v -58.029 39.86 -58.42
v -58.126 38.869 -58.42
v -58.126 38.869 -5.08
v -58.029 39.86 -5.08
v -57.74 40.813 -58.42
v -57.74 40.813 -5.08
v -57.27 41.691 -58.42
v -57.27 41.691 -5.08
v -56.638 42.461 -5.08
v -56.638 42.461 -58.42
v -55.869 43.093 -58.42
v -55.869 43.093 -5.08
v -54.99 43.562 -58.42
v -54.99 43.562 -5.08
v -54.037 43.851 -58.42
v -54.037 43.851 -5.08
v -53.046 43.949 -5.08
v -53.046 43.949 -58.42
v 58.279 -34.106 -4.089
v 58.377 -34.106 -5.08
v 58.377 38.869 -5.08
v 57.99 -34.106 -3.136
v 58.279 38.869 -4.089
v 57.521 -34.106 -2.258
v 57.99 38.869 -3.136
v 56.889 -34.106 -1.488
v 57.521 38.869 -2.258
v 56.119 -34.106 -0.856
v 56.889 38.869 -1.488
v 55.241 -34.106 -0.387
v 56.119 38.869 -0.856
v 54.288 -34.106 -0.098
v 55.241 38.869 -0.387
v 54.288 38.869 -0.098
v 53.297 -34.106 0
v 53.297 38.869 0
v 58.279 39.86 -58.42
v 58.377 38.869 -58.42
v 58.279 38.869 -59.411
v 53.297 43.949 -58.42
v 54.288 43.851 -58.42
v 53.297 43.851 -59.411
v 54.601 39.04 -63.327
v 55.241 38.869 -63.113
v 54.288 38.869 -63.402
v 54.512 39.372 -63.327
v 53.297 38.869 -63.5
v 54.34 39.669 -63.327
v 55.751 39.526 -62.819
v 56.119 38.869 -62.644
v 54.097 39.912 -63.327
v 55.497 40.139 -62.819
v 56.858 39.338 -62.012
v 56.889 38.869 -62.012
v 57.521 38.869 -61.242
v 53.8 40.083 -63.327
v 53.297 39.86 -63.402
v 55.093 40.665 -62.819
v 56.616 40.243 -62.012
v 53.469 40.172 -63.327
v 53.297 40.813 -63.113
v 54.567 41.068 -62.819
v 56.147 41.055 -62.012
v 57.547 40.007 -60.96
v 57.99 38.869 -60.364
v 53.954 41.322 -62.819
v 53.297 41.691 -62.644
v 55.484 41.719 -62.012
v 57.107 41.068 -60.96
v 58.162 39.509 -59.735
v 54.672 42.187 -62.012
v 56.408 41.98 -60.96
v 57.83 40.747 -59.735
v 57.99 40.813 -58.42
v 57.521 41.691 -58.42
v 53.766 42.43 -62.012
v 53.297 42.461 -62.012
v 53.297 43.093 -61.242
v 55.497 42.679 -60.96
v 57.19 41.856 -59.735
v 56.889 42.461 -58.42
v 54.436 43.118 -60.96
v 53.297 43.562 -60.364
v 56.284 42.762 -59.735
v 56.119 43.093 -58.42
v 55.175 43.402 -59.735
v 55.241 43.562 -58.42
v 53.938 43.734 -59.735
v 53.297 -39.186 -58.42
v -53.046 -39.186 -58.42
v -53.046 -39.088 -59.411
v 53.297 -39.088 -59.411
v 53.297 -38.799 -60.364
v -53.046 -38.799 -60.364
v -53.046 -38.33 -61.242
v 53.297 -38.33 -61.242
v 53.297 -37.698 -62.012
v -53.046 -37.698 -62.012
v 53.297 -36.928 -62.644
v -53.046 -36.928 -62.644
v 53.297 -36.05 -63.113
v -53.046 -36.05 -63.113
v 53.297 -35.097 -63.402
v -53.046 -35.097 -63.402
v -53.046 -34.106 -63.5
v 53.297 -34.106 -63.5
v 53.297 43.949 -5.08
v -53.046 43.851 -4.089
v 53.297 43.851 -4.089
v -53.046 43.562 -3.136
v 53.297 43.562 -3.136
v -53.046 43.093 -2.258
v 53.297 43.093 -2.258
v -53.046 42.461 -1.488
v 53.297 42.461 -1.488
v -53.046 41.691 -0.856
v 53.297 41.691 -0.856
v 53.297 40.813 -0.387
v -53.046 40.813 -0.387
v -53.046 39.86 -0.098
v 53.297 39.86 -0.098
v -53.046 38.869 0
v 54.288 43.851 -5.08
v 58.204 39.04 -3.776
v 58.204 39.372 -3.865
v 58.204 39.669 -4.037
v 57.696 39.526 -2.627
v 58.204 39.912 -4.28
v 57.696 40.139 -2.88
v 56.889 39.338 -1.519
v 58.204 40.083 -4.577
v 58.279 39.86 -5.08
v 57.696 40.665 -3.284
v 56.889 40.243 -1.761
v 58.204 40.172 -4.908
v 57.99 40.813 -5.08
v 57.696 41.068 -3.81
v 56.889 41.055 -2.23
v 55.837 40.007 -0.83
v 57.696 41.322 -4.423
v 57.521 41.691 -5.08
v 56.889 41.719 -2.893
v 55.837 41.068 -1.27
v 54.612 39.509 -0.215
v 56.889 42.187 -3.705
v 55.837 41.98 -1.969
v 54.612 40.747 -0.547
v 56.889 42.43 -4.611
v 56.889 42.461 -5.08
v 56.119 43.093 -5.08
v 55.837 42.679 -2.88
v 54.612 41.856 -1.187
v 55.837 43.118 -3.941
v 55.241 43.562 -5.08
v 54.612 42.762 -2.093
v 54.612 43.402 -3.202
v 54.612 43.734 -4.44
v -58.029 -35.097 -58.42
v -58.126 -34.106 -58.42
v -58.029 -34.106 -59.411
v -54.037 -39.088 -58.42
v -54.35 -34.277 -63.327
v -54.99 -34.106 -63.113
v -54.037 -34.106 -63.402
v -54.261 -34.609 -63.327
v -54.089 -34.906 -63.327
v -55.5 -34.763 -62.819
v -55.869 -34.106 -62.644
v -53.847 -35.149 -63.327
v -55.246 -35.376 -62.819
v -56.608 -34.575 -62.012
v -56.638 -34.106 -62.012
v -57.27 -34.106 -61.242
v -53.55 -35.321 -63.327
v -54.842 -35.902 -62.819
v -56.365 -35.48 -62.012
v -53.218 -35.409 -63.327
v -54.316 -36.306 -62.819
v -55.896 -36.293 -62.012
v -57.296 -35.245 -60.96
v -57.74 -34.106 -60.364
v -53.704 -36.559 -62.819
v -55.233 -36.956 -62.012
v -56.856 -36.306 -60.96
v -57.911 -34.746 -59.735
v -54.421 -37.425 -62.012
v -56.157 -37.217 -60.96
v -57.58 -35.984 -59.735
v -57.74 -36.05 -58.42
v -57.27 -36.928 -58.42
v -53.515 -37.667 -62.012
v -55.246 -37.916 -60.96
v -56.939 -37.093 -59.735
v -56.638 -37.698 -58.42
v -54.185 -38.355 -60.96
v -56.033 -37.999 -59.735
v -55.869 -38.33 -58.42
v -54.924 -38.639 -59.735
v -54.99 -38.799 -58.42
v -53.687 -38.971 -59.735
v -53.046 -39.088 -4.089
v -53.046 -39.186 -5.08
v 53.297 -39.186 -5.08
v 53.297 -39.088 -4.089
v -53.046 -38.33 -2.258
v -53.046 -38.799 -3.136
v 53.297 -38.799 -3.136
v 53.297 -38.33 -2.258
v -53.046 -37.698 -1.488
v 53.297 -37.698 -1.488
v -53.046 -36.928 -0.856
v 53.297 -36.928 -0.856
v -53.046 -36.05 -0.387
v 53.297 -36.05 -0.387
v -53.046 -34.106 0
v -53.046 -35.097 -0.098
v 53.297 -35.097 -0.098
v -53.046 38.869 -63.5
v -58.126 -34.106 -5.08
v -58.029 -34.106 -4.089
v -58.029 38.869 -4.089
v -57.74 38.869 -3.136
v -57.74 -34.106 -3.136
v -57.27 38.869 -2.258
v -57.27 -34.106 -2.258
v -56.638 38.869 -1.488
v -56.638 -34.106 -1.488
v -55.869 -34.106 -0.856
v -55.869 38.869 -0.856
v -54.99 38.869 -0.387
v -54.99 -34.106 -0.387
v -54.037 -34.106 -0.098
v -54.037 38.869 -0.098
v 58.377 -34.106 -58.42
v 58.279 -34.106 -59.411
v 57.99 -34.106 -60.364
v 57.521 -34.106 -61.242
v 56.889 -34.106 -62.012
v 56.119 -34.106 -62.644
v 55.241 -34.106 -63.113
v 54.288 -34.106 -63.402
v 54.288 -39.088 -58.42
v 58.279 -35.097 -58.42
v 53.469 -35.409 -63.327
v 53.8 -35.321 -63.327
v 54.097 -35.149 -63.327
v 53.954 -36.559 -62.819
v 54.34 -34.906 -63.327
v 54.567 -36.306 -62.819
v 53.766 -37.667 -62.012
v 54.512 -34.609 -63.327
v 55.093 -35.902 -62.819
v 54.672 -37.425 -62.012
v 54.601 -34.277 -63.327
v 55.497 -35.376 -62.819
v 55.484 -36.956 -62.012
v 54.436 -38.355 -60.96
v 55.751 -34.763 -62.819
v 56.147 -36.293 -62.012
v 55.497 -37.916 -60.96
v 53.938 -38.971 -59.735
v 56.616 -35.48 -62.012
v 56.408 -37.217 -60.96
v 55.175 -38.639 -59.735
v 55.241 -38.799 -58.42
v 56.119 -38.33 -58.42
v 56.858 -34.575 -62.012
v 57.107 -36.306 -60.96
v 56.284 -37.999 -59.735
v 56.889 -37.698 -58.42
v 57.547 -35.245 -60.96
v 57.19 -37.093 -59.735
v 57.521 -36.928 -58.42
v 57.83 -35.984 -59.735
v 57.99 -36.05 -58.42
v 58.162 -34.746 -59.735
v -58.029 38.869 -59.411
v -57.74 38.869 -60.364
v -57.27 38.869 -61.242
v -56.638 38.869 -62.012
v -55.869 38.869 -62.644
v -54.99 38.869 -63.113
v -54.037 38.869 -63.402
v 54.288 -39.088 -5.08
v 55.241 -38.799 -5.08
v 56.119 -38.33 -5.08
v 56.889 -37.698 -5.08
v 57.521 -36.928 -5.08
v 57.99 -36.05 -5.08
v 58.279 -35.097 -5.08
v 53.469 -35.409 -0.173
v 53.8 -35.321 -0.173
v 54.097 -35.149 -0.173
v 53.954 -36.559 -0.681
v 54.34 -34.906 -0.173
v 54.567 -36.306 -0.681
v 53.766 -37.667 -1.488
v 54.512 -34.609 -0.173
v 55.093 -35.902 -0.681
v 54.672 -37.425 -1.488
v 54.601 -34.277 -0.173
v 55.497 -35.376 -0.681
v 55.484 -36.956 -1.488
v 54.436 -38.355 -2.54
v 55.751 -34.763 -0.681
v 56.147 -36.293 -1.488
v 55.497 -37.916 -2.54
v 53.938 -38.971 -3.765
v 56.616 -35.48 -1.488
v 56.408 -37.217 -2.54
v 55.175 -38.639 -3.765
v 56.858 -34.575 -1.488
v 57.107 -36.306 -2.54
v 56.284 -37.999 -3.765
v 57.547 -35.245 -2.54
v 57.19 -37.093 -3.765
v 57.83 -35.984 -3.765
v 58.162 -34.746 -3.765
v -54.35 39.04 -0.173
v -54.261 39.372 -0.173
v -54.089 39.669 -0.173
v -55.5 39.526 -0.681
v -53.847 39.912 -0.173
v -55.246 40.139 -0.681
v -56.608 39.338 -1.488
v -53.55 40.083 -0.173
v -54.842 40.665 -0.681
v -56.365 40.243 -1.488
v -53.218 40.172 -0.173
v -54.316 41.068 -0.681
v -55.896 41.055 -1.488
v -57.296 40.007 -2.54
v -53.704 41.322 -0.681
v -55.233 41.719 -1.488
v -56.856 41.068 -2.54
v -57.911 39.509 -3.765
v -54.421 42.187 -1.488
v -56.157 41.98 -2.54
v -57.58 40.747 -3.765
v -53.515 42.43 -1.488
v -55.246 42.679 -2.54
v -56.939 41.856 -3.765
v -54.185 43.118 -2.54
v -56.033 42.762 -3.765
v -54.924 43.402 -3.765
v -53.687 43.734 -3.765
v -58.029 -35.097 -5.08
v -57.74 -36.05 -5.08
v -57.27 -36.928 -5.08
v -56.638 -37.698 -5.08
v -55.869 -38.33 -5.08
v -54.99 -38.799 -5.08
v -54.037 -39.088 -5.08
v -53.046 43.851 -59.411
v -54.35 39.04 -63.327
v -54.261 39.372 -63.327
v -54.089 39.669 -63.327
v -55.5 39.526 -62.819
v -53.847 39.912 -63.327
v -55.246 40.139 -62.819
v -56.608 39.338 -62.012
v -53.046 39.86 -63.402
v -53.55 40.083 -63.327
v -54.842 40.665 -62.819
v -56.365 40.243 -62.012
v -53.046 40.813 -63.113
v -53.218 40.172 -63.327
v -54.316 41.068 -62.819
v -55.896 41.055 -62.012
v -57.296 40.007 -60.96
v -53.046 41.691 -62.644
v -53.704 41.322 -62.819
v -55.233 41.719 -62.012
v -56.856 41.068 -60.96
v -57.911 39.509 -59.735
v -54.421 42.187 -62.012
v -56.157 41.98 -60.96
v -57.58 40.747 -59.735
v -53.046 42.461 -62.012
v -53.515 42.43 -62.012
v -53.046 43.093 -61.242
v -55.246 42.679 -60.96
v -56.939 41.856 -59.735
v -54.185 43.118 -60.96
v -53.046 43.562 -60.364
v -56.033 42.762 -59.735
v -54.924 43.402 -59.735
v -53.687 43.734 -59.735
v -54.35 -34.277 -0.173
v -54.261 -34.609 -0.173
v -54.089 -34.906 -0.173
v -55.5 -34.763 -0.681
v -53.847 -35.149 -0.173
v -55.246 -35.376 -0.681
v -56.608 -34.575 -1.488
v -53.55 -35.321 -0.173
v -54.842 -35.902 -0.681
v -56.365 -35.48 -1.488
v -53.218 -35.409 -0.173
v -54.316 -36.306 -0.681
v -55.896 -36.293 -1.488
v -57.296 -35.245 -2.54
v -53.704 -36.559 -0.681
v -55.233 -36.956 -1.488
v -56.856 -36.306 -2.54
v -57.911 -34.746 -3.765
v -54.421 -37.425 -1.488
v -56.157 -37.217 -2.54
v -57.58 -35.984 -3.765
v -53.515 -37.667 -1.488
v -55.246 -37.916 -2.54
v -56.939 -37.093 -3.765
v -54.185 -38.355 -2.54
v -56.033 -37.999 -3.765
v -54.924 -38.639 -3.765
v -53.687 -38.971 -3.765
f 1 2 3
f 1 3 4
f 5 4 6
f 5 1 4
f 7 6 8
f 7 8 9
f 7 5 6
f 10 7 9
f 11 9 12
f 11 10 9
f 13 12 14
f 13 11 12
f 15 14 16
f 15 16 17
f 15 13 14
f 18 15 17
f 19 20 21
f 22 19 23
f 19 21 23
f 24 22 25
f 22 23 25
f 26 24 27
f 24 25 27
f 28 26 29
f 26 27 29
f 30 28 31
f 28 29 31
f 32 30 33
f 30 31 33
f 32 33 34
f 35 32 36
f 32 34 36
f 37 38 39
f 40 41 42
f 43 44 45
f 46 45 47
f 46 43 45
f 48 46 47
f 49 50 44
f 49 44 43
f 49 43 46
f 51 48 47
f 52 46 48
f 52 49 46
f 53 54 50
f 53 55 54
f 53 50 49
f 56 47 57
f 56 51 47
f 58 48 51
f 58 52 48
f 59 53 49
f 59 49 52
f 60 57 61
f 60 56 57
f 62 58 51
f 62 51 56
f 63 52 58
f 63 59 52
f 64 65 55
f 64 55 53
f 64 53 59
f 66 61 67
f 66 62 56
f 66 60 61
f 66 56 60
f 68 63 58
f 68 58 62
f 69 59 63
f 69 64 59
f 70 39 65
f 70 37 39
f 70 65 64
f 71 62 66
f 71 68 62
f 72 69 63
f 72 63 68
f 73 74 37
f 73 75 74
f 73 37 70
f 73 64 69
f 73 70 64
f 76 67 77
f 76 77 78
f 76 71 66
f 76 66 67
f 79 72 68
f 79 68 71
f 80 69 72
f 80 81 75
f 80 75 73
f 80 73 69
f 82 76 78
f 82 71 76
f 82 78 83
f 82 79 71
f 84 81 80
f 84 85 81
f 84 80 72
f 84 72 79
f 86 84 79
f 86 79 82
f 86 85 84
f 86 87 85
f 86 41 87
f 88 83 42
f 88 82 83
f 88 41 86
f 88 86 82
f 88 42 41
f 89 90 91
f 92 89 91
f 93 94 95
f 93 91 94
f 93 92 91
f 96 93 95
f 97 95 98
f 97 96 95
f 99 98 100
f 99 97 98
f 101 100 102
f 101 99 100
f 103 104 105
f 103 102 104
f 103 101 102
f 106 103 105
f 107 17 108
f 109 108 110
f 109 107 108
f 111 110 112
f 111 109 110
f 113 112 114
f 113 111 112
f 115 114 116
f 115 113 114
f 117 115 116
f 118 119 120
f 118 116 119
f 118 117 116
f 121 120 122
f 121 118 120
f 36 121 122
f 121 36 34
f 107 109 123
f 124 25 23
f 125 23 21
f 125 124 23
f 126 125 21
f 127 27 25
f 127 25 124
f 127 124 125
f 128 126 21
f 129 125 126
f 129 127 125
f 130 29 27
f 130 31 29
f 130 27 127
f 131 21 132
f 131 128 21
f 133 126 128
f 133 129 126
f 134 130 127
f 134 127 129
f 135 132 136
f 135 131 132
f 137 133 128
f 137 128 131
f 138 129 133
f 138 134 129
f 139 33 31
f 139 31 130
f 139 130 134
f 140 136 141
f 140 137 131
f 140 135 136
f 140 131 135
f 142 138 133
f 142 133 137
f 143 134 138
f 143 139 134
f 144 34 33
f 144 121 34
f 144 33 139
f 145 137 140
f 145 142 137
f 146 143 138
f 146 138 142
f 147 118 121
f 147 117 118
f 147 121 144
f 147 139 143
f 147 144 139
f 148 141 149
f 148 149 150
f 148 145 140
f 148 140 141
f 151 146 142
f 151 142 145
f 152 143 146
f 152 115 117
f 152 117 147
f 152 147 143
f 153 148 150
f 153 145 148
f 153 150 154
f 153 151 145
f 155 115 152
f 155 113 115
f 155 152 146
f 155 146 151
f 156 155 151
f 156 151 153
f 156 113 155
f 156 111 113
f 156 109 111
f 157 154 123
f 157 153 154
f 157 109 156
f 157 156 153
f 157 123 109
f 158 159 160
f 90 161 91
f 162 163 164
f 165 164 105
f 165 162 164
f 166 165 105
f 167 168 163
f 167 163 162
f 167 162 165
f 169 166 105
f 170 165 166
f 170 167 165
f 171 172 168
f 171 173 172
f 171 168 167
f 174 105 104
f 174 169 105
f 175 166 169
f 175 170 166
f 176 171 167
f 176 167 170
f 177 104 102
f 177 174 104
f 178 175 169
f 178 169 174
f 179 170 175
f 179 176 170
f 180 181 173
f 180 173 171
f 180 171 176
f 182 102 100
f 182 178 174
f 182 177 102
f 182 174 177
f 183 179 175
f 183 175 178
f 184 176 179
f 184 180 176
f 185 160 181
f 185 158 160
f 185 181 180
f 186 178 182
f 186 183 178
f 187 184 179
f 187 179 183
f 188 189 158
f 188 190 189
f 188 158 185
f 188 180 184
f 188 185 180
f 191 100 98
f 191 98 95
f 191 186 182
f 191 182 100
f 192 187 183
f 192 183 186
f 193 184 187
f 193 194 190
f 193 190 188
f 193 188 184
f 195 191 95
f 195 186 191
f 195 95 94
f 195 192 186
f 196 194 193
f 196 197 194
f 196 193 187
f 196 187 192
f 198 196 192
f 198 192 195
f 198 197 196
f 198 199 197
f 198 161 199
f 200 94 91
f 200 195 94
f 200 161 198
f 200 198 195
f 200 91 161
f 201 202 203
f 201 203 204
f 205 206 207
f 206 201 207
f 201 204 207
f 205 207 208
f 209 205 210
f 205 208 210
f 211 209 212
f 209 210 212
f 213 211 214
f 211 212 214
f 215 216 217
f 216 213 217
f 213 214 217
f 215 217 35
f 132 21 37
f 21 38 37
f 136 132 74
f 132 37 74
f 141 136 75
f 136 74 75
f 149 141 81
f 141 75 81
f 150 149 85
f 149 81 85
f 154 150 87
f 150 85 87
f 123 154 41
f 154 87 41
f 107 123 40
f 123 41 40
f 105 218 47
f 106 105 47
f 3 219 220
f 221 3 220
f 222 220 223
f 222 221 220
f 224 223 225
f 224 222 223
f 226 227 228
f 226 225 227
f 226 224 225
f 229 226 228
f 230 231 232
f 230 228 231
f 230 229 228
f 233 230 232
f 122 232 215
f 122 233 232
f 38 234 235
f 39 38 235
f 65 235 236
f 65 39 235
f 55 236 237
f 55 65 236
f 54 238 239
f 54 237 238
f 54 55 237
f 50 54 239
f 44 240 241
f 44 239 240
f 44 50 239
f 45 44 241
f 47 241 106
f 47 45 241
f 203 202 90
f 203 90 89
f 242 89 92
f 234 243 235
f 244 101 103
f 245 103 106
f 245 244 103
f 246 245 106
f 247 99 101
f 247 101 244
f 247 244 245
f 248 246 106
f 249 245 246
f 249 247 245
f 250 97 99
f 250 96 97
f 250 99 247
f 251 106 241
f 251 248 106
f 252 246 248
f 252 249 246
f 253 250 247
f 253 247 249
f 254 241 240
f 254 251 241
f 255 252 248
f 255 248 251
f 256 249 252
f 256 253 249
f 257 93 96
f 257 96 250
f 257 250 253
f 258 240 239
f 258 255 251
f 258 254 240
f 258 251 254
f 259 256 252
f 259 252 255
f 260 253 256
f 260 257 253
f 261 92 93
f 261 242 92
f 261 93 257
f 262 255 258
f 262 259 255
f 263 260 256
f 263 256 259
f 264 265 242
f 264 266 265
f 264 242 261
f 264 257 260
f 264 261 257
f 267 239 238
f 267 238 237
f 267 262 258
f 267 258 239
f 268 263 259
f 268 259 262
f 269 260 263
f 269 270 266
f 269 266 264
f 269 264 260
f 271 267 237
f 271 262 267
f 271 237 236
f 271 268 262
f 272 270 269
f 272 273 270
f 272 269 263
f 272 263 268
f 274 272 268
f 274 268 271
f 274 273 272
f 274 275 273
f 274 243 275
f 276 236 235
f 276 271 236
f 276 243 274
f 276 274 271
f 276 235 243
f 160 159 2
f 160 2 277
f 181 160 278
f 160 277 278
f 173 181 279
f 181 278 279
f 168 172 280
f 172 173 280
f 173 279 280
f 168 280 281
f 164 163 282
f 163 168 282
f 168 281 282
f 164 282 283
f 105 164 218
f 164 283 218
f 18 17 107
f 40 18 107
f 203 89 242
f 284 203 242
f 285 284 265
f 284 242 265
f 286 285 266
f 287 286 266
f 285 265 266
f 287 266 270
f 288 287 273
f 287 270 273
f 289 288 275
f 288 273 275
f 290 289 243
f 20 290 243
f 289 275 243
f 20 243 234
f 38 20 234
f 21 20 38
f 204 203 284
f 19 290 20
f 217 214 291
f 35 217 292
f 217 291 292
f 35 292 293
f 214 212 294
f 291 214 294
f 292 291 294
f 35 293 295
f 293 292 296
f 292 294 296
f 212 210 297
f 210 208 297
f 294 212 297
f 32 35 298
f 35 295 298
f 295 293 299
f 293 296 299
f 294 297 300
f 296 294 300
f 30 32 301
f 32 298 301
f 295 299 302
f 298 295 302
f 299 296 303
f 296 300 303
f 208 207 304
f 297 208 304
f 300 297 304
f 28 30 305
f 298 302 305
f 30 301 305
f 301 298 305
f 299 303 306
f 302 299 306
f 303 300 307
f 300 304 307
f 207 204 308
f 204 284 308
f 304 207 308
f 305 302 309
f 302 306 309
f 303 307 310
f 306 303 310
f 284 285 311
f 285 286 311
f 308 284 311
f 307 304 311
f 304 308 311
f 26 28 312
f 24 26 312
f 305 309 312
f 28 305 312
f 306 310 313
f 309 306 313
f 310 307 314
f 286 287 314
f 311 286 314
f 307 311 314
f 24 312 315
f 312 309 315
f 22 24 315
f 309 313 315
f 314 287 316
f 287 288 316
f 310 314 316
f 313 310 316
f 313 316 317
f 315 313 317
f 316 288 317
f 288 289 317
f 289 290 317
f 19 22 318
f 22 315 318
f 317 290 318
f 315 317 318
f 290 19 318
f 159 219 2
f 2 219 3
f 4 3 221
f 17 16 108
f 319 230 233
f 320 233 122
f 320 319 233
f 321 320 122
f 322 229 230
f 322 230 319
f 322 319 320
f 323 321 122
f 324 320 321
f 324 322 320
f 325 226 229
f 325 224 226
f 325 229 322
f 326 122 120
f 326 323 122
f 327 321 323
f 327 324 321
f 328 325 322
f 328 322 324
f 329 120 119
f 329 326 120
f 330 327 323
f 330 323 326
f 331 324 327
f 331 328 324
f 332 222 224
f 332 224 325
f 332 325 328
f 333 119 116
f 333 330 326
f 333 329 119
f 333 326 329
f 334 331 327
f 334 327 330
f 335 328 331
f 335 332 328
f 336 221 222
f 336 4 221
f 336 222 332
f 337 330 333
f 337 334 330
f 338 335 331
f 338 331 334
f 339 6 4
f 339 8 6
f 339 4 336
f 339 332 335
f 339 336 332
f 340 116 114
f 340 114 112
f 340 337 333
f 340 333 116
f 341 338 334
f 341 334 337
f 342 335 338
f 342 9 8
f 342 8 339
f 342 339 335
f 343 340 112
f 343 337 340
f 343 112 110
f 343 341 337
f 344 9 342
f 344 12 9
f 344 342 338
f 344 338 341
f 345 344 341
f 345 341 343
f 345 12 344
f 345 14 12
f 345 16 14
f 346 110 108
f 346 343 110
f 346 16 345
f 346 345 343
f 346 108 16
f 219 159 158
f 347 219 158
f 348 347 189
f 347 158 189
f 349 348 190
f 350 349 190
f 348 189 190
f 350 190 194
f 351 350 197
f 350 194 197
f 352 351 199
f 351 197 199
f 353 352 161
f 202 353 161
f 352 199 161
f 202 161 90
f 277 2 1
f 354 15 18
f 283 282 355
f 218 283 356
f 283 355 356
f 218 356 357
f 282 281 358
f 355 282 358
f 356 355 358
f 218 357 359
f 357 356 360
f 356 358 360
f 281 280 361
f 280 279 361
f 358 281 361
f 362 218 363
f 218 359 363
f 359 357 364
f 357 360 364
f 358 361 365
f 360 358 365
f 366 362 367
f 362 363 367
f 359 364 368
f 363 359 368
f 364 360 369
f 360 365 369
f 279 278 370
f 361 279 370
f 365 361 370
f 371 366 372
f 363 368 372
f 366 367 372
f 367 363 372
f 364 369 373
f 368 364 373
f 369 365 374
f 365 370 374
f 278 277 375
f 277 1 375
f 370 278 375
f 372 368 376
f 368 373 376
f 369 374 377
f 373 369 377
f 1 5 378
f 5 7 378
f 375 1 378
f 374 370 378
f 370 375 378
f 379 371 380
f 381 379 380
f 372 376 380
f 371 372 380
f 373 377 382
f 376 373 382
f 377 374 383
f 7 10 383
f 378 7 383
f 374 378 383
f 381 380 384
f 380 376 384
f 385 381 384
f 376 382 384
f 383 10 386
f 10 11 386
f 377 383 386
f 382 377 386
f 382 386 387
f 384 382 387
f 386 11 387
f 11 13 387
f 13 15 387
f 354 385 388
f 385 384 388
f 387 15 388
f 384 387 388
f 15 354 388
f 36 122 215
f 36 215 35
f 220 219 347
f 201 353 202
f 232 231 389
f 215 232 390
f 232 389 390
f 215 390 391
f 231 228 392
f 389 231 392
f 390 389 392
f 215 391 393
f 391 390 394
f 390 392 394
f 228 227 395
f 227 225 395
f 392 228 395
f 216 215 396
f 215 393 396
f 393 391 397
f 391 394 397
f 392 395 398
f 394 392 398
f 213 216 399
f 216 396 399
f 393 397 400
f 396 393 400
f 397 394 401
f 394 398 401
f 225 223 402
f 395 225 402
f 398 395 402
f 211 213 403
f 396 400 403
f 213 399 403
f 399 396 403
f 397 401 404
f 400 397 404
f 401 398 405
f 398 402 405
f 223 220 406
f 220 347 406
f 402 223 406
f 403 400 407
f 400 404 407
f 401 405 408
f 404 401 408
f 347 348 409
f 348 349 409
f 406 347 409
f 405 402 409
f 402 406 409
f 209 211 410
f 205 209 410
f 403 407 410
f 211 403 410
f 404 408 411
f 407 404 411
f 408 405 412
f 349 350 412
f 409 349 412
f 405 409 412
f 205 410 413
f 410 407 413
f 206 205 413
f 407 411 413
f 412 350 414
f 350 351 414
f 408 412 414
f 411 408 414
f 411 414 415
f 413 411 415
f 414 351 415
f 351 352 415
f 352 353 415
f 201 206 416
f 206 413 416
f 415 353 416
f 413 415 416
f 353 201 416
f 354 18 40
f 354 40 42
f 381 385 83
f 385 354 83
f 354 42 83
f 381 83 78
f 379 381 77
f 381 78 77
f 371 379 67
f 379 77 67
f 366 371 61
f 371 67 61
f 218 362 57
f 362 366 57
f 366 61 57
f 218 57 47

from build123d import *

# Parameters (mm, degrees)
F0_W     = 116.503421
F0_H     = 83.134603
F1_DEPTH = 63.5
F2_R     = 5.08


with BuildPart() as f1:
    # F0 (on Top) → F1 (new body)
    with BuildSketch(Plane.XY):
        with Locations((0.125355, 2.381445)):
            Rectangle(F0_W, F0_H)
    extrude(amount=-F1_DEPTH)

    # F2
    f2_edges = [f1.edges().sort_by_distance(p)[0] for p in [
        (-58.126356, 43.948747, -31.75),
        (-58.126356, -39.185856, -31.75),
        (-58.126356, 2.381446, 0),
        (-58.126356, 2.381446, -63.5),
        (58.377065, -39.185856, -31.75),
        (0.125354, -39.185856, 0),
        (0.125354, -39.185856, -63.5),
        (0.125354, 43.948747, 0),
        (58.377065, 2.381446, 0),
        (58.377065, 43.948747, -31.75),
        (58.377065, 2.381446, -63.5),
        (0.125354, 43.948747, -63.5),
    ]]
    fillet(f2_edges, radius=F2_R)


solid = f1.part
